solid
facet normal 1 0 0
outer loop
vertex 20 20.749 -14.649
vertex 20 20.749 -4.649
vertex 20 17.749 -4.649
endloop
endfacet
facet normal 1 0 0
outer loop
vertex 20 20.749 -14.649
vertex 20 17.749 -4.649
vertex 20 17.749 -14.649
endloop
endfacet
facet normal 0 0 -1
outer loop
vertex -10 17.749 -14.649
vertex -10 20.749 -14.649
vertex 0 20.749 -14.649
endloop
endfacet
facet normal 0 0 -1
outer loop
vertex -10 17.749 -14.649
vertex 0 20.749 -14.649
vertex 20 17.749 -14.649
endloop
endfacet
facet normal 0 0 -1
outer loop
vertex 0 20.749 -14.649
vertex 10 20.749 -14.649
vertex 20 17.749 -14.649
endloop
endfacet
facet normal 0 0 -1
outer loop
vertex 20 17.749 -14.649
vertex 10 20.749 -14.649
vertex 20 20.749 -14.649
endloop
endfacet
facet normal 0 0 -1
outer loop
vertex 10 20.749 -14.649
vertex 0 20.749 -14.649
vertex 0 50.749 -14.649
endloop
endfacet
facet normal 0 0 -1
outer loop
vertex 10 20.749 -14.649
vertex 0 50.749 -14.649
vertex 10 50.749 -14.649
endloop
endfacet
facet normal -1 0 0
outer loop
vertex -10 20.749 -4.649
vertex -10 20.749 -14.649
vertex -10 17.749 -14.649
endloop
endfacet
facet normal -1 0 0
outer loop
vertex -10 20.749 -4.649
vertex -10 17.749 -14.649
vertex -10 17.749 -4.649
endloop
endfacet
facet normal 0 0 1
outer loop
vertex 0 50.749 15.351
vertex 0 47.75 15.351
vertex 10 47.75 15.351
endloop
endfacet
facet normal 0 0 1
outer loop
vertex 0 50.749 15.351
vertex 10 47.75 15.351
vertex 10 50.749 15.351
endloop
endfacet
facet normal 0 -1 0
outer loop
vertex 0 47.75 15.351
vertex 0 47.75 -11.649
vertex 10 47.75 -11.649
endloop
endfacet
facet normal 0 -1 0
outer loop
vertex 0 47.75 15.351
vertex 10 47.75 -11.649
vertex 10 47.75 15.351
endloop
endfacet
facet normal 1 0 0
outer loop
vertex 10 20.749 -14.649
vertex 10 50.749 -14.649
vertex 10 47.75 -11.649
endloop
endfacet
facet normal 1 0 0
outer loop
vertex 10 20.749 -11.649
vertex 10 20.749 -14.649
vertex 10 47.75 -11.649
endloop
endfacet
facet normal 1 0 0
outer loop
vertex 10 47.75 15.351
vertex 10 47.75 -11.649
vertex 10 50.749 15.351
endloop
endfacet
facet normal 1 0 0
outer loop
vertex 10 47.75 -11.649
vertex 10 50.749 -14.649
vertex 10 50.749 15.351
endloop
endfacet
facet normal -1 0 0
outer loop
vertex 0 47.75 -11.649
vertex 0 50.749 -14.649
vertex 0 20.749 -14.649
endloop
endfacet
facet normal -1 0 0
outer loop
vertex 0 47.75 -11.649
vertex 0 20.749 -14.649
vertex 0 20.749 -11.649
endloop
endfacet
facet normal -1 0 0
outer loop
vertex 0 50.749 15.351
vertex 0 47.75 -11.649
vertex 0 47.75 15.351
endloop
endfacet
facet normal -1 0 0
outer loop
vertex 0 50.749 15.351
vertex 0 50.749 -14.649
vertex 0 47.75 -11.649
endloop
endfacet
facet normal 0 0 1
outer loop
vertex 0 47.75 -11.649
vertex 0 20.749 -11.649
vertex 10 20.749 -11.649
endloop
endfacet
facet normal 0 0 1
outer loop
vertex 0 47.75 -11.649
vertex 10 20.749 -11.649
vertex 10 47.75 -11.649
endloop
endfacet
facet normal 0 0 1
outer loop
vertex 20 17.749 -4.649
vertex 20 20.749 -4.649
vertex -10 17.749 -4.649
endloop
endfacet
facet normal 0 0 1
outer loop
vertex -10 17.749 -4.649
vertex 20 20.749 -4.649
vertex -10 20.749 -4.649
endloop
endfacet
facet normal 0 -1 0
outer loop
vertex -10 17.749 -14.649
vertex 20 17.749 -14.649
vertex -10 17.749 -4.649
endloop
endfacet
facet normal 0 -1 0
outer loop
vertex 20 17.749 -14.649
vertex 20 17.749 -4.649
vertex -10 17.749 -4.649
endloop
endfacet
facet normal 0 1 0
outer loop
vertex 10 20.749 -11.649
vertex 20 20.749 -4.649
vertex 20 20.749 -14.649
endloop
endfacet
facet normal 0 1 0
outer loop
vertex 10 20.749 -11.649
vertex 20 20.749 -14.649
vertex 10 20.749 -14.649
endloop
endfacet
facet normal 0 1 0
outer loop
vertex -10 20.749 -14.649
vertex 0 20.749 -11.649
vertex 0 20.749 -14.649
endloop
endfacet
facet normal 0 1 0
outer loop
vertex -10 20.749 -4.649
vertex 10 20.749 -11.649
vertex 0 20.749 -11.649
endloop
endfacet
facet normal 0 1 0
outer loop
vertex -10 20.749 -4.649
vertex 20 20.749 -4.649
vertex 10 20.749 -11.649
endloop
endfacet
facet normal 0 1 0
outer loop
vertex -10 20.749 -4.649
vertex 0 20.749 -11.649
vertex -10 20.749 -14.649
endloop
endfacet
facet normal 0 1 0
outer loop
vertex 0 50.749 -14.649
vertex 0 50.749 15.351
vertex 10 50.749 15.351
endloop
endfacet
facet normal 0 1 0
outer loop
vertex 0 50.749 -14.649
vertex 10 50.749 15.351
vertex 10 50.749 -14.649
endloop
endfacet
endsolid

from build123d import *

# Parameters (mm, degrees)
EXTRUDE_2_DEPTH = 10
EXTRUDE_3_DEPTH = 3


with BuildPart() as part:
    # 草图2 → 凸台-拉伸2 (new body)
    with BuildSketch(Plane(origin=(0, 0, 0), x_dir=(0, 0, -1), z_dir=(1, 0, 0))):
        Polygon((-15.350951503, 50.748946778), (14.649048497, 50.748946778), (14.649048497, 20.748946778), (11.649048497, 20.748946778), (11.649048497, 47.75022668), (-15.350951503, 47.75022668), align=None)
    extrude(amount=EXTRUDE_2_DEPTH)

    # 草图4 → 凸台-拉伸3 (add)
    with BuildSketch(Plane.XZ.offset(-20.748946778)):
        Polygon((10, -14.649048497), (-10, -14.649048497), (-10, -4.649048497), (10, -4.649048497), (20, -4.649048497), (20, -14.649048497), align=None)
    extrude(amount=EXTRUDE_3_DEPTH)


solid = part.part
